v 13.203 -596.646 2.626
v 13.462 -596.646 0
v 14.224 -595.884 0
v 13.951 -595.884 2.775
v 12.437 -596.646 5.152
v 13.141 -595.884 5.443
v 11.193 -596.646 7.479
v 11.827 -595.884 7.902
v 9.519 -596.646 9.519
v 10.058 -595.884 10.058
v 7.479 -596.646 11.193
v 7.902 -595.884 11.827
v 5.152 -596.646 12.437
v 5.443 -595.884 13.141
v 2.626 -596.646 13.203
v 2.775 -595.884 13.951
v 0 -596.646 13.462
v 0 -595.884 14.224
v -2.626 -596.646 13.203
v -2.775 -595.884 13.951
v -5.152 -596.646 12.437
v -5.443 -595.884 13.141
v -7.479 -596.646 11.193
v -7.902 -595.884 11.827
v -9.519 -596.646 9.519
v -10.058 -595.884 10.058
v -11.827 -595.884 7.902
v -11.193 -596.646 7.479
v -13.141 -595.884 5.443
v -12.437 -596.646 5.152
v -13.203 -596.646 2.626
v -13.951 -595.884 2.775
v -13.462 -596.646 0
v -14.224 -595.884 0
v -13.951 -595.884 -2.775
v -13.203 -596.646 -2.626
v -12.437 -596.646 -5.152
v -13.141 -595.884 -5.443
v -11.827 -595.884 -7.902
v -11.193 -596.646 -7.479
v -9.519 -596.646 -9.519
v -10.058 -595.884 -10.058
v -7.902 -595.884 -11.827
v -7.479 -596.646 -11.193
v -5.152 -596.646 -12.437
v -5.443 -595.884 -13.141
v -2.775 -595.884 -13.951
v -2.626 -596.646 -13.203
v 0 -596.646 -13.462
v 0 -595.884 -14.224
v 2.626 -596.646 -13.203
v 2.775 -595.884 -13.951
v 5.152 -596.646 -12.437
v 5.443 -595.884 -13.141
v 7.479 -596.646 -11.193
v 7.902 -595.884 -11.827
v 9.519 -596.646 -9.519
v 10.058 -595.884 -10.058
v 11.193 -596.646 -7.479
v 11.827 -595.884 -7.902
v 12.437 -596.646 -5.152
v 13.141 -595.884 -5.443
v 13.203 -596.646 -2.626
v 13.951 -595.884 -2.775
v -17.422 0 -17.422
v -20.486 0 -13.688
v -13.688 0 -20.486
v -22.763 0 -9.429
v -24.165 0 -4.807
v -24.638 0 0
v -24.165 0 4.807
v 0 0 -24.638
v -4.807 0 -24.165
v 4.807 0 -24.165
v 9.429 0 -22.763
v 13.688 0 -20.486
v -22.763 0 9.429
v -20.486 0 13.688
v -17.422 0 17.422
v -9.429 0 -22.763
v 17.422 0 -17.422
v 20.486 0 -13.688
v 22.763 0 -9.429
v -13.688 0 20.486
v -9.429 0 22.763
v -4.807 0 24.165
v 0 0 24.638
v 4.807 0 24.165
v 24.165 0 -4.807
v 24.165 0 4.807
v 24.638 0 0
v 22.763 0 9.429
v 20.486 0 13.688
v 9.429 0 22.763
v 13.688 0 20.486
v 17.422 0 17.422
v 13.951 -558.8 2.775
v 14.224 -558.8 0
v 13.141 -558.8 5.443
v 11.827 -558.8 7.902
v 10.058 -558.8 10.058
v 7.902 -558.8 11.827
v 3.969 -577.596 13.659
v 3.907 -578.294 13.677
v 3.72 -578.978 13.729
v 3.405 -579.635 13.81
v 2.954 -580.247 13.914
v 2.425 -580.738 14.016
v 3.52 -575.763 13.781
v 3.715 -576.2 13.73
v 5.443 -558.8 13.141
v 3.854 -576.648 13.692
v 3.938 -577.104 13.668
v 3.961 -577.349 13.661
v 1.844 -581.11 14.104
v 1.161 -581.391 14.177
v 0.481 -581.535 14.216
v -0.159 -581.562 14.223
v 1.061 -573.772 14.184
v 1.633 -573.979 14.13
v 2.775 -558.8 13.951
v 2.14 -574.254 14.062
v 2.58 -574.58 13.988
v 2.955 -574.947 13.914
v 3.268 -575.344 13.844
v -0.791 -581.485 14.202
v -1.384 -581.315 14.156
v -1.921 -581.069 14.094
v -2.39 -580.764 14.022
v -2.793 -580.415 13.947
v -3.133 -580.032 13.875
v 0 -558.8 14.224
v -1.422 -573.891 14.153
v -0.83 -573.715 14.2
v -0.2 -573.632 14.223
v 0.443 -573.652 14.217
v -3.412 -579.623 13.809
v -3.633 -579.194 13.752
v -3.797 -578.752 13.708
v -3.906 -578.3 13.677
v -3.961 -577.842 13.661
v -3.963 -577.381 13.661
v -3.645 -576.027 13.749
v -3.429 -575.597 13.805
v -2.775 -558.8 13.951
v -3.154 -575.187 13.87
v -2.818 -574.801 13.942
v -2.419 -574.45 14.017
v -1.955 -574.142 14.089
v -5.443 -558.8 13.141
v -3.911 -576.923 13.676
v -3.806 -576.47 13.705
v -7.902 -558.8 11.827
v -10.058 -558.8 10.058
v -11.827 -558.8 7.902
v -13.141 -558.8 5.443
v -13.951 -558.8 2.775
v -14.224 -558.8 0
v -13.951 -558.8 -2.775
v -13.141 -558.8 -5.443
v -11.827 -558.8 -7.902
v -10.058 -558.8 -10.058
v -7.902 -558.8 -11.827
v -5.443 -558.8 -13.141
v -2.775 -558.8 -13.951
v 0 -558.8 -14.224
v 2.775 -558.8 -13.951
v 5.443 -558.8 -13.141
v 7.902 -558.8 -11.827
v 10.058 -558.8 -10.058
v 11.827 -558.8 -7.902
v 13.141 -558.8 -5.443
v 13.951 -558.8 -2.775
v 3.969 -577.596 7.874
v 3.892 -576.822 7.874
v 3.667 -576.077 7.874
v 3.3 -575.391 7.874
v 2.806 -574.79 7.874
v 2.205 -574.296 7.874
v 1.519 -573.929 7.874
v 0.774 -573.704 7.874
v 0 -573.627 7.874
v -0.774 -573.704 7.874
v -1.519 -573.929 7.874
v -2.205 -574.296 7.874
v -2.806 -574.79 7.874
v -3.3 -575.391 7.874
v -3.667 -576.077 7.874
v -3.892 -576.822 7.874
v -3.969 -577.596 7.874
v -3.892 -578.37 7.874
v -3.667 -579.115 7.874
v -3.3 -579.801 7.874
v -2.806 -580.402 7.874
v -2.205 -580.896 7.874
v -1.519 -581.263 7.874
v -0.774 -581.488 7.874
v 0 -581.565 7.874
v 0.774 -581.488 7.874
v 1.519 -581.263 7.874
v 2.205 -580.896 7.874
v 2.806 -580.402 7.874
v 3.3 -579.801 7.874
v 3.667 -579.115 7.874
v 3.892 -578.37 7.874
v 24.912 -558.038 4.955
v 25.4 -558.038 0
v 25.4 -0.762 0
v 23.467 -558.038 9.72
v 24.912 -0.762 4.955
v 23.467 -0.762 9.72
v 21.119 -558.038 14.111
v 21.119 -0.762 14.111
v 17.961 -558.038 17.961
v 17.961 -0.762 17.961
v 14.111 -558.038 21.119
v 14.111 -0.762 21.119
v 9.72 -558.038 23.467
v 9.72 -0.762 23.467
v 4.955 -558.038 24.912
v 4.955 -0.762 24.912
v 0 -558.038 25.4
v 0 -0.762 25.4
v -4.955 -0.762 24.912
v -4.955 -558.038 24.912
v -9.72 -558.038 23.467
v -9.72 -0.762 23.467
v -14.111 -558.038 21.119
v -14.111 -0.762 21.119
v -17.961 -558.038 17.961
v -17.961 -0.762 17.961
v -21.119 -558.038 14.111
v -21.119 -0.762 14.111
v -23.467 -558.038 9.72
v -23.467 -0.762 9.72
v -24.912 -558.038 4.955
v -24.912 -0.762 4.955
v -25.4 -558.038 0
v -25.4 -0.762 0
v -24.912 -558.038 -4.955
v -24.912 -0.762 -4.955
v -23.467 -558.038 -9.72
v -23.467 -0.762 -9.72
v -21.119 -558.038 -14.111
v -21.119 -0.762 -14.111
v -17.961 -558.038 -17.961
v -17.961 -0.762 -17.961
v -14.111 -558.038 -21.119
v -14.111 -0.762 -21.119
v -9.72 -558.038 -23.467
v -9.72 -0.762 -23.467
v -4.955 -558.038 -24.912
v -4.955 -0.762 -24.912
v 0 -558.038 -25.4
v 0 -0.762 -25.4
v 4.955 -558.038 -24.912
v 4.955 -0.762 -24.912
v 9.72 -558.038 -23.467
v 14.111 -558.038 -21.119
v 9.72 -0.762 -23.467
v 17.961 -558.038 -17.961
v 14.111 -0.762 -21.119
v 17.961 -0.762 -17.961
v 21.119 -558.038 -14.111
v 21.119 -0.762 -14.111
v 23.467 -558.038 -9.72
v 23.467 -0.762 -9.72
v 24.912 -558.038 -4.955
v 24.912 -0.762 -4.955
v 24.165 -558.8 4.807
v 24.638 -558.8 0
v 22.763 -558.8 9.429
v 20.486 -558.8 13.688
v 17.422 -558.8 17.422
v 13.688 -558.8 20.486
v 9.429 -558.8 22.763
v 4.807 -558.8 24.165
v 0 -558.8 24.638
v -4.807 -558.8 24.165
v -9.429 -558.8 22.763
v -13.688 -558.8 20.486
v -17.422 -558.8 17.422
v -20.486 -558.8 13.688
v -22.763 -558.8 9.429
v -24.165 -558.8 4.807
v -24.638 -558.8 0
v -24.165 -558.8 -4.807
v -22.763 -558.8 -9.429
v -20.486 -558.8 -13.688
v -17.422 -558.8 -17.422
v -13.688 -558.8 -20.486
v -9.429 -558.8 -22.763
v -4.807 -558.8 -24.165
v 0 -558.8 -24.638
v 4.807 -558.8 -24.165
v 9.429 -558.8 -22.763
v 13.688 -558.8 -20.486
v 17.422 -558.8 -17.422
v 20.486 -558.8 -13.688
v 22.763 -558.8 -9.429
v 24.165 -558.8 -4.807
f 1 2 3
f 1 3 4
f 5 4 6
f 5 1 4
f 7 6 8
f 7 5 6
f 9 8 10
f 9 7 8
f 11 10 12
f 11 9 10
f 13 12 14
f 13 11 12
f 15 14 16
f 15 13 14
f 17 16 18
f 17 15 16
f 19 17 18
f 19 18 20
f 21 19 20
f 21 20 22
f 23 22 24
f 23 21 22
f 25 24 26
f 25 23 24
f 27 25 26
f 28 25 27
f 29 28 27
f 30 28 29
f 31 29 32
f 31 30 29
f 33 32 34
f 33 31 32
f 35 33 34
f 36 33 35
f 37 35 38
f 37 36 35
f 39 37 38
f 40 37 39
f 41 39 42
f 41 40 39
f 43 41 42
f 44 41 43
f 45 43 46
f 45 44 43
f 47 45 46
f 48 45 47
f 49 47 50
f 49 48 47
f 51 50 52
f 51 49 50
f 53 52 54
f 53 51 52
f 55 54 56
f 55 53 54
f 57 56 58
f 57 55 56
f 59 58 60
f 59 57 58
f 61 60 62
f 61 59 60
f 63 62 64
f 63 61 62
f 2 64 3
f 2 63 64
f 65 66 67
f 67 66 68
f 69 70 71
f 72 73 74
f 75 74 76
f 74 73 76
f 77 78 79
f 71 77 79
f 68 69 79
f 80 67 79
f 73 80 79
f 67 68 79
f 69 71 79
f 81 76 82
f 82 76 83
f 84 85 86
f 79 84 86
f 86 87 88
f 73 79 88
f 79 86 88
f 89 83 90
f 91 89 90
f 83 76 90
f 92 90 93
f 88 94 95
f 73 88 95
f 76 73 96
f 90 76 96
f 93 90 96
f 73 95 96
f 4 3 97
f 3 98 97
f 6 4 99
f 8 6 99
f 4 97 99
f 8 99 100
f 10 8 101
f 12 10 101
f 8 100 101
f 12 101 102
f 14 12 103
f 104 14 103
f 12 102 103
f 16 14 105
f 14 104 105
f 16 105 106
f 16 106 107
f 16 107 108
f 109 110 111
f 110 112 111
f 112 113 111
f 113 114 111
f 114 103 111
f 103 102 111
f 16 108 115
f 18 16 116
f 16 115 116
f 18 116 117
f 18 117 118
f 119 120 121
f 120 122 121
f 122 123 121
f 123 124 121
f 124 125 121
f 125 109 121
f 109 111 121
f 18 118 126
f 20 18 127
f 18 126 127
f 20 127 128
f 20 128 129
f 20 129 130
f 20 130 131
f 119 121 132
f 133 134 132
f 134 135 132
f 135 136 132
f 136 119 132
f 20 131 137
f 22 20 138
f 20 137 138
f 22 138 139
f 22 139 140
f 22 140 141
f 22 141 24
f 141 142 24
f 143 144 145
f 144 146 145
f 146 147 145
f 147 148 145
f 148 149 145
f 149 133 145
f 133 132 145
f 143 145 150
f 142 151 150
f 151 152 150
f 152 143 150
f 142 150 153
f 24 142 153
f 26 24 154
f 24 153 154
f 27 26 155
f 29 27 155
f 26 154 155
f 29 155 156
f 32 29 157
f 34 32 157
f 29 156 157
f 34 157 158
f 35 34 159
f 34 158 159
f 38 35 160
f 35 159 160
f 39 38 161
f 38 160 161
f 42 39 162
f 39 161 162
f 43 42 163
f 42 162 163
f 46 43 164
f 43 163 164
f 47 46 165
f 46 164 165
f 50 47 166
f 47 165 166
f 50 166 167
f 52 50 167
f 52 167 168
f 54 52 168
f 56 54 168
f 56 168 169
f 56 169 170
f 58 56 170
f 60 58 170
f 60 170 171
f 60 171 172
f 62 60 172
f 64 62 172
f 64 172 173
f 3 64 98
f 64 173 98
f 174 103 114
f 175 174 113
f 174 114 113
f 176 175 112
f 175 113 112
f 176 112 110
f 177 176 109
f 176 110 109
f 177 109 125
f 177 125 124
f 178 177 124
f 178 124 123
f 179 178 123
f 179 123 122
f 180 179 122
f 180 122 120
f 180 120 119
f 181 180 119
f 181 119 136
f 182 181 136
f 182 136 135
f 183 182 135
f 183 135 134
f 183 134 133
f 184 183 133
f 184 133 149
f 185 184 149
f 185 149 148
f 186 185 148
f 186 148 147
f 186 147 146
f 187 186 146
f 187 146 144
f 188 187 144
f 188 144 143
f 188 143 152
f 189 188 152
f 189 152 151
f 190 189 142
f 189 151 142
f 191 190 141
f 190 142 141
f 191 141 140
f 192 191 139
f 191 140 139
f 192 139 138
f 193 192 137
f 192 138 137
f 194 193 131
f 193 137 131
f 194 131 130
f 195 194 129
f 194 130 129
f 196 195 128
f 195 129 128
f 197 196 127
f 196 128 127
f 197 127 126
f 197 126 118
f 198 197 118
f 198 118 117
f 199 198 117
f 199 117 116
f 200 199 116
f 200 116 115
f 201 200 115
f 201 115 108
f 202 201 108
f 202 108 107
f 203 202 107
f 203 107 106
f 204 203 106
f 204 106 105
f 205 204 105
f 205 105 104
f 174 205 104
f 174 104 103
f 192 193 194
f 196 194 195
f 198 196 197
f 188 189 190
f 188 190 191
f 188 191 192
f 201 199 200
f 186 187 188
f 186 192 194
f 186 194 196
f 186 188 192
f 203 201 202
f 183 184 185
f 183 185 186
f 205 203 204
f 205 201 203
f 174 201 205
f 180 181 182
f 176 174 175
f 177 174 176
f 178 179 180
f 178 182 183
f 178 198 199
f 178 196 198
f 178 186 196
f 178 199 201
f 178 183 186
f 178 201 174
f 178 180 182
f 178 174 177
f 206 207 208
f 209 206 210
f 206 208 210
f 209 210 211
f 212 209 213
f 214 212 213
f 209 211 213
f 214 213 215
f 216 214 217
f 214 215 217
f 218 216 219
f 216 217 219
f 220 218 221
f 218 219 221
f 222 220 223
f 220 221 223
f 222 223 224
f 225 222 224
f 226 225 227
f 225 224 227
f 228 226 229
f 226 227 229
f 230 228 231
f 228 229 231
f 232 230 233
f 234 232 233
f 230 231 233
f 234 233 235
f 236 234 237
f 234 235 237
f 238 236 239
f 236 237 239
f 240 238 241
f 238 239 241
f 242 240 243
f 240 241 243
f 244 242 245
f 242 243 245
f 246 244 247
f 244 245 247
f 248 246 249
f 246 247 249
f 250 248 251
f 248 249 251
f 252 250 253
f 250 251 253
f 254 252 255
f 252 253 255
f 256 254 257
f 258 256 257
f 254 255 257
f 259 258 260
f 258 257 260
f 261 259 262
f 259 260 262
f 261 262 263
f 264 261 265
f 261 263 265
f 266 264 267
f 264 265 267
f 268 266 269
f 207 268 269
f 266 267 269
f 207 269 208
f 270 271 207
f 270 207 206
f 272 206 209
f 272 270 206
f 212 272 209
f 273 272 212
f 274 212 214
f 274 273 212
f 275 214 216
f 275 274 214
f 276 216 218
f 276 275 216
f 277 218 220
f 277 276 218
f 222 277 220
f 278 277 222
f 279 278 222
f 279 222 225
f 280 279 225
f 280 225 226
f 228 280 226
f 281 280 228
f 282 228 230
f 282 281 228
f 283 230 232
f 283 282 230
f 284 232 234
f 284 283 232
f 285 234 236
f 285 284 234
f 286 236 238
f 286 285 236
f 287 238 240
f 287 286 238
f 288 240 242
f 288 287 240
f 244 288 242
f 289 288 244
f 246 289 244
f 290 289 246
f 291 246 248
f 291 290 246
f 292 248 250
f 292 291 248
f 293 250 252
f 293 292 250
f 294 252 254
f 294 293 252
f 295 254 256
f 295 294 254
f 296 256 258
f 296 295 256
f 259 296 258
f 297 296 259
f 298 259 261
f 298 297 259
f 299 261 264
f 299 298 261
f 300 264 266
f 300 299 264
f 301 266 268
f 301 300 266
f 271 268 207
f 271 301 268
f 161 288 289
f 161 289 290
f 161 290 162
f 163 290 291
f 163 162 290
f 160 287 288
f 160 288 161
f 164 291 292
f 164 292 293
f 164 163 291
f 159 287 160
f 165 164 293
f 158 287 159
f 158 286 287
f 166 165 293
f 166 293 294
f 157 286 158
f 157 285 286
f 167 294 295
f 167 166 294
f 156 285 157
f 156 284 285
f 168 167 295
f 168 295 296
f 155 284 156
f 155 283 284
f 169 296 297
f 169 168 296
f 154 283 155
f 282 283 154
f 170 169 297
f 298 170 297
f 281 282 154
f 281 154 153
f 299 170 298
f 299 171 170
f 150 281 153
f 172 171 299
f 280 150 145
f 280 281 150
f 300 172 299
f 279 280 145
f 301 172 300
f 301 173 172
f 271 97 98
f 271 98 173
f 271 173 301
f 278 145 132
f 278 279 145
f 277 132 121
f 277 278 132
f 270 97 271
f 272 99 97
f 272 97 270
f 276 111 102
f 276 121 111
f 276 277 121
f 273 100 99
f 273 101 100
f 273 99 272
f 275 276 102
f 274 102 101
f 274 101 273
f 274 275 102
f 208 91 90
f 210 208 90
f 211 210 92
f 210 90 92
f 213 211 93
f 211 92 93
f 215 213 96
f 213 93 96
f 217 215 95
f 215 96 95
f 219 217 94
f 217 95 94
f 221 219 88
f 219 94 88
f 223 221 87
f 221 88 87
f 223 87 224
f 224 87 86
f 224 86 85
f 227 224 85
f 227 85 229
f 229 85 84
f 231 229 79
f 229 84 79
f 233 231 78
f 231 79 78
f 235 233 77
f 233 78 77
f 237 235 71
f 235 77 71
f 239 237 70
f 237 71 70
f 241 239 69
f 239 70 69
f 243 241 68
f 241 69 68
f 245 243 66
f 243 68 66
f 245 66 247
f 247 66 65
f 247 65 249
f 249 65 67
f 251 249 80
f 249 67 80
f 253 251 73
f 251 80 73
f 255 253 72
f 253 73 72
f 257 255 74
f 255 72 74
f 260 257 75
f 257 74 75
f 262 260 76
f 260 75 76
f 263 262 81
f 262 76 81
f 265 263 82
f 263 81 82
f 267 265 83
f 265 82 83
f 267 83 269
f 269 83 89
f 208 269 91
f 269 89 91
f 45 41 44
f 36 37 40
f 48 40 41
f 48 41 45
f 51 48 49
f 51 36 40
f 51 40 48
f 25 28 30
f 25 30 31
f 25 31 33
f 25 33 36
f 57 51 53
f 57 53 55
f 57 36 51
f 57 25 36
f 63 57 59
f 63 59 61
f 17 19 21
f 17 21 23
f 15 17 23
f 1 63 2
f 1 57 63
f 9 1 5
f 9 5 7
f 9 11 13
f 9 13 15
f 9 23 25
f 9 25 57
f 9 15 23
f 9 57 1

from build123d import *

# Parameters (mm, degrees)
F0_R     = 25.4
F1_DEPTH = 558.8
F2_R     = 14.224
F3_DEPTH = 37.846
F4_SIZE  = 0.762
F6_R     = 3.96875
F7_DEPTH = 6.35


with BuildPart() as f1:
    # F0 (on Front) → F1 (new body)
    with BuildSketch(Plane.XZ):
        Circle(F0_R)
    extrude(amount=F1_DEPTH)

    # F2 (on face) → F3 (join)
    with BuildSketch(Plane.XZ.offset(558.8)):
        Circle(F2_R)
    extrude(amount=F3_DEPTH)

    # F4
    f4_edges = [f1.edges().sort_by_distance(p)[0] for p in [
        (-14.224, -596.646, 0),
        (-25.4, -558.8, 0),
        (-25.4, 0, 0),
    ]]
    chamfer(f4_edges, length=F4_SIZE)

    # F6 (on offset) → F7 (cut)
    with BuildSketch(Plane.XY.offset(14.224)):
        with Locations((0, -577.596)):
            Circle(F6_R)
    extrude(amount=-F7_DEPTH, mode=Mode.SUBTRACT)


solid = f1.part
